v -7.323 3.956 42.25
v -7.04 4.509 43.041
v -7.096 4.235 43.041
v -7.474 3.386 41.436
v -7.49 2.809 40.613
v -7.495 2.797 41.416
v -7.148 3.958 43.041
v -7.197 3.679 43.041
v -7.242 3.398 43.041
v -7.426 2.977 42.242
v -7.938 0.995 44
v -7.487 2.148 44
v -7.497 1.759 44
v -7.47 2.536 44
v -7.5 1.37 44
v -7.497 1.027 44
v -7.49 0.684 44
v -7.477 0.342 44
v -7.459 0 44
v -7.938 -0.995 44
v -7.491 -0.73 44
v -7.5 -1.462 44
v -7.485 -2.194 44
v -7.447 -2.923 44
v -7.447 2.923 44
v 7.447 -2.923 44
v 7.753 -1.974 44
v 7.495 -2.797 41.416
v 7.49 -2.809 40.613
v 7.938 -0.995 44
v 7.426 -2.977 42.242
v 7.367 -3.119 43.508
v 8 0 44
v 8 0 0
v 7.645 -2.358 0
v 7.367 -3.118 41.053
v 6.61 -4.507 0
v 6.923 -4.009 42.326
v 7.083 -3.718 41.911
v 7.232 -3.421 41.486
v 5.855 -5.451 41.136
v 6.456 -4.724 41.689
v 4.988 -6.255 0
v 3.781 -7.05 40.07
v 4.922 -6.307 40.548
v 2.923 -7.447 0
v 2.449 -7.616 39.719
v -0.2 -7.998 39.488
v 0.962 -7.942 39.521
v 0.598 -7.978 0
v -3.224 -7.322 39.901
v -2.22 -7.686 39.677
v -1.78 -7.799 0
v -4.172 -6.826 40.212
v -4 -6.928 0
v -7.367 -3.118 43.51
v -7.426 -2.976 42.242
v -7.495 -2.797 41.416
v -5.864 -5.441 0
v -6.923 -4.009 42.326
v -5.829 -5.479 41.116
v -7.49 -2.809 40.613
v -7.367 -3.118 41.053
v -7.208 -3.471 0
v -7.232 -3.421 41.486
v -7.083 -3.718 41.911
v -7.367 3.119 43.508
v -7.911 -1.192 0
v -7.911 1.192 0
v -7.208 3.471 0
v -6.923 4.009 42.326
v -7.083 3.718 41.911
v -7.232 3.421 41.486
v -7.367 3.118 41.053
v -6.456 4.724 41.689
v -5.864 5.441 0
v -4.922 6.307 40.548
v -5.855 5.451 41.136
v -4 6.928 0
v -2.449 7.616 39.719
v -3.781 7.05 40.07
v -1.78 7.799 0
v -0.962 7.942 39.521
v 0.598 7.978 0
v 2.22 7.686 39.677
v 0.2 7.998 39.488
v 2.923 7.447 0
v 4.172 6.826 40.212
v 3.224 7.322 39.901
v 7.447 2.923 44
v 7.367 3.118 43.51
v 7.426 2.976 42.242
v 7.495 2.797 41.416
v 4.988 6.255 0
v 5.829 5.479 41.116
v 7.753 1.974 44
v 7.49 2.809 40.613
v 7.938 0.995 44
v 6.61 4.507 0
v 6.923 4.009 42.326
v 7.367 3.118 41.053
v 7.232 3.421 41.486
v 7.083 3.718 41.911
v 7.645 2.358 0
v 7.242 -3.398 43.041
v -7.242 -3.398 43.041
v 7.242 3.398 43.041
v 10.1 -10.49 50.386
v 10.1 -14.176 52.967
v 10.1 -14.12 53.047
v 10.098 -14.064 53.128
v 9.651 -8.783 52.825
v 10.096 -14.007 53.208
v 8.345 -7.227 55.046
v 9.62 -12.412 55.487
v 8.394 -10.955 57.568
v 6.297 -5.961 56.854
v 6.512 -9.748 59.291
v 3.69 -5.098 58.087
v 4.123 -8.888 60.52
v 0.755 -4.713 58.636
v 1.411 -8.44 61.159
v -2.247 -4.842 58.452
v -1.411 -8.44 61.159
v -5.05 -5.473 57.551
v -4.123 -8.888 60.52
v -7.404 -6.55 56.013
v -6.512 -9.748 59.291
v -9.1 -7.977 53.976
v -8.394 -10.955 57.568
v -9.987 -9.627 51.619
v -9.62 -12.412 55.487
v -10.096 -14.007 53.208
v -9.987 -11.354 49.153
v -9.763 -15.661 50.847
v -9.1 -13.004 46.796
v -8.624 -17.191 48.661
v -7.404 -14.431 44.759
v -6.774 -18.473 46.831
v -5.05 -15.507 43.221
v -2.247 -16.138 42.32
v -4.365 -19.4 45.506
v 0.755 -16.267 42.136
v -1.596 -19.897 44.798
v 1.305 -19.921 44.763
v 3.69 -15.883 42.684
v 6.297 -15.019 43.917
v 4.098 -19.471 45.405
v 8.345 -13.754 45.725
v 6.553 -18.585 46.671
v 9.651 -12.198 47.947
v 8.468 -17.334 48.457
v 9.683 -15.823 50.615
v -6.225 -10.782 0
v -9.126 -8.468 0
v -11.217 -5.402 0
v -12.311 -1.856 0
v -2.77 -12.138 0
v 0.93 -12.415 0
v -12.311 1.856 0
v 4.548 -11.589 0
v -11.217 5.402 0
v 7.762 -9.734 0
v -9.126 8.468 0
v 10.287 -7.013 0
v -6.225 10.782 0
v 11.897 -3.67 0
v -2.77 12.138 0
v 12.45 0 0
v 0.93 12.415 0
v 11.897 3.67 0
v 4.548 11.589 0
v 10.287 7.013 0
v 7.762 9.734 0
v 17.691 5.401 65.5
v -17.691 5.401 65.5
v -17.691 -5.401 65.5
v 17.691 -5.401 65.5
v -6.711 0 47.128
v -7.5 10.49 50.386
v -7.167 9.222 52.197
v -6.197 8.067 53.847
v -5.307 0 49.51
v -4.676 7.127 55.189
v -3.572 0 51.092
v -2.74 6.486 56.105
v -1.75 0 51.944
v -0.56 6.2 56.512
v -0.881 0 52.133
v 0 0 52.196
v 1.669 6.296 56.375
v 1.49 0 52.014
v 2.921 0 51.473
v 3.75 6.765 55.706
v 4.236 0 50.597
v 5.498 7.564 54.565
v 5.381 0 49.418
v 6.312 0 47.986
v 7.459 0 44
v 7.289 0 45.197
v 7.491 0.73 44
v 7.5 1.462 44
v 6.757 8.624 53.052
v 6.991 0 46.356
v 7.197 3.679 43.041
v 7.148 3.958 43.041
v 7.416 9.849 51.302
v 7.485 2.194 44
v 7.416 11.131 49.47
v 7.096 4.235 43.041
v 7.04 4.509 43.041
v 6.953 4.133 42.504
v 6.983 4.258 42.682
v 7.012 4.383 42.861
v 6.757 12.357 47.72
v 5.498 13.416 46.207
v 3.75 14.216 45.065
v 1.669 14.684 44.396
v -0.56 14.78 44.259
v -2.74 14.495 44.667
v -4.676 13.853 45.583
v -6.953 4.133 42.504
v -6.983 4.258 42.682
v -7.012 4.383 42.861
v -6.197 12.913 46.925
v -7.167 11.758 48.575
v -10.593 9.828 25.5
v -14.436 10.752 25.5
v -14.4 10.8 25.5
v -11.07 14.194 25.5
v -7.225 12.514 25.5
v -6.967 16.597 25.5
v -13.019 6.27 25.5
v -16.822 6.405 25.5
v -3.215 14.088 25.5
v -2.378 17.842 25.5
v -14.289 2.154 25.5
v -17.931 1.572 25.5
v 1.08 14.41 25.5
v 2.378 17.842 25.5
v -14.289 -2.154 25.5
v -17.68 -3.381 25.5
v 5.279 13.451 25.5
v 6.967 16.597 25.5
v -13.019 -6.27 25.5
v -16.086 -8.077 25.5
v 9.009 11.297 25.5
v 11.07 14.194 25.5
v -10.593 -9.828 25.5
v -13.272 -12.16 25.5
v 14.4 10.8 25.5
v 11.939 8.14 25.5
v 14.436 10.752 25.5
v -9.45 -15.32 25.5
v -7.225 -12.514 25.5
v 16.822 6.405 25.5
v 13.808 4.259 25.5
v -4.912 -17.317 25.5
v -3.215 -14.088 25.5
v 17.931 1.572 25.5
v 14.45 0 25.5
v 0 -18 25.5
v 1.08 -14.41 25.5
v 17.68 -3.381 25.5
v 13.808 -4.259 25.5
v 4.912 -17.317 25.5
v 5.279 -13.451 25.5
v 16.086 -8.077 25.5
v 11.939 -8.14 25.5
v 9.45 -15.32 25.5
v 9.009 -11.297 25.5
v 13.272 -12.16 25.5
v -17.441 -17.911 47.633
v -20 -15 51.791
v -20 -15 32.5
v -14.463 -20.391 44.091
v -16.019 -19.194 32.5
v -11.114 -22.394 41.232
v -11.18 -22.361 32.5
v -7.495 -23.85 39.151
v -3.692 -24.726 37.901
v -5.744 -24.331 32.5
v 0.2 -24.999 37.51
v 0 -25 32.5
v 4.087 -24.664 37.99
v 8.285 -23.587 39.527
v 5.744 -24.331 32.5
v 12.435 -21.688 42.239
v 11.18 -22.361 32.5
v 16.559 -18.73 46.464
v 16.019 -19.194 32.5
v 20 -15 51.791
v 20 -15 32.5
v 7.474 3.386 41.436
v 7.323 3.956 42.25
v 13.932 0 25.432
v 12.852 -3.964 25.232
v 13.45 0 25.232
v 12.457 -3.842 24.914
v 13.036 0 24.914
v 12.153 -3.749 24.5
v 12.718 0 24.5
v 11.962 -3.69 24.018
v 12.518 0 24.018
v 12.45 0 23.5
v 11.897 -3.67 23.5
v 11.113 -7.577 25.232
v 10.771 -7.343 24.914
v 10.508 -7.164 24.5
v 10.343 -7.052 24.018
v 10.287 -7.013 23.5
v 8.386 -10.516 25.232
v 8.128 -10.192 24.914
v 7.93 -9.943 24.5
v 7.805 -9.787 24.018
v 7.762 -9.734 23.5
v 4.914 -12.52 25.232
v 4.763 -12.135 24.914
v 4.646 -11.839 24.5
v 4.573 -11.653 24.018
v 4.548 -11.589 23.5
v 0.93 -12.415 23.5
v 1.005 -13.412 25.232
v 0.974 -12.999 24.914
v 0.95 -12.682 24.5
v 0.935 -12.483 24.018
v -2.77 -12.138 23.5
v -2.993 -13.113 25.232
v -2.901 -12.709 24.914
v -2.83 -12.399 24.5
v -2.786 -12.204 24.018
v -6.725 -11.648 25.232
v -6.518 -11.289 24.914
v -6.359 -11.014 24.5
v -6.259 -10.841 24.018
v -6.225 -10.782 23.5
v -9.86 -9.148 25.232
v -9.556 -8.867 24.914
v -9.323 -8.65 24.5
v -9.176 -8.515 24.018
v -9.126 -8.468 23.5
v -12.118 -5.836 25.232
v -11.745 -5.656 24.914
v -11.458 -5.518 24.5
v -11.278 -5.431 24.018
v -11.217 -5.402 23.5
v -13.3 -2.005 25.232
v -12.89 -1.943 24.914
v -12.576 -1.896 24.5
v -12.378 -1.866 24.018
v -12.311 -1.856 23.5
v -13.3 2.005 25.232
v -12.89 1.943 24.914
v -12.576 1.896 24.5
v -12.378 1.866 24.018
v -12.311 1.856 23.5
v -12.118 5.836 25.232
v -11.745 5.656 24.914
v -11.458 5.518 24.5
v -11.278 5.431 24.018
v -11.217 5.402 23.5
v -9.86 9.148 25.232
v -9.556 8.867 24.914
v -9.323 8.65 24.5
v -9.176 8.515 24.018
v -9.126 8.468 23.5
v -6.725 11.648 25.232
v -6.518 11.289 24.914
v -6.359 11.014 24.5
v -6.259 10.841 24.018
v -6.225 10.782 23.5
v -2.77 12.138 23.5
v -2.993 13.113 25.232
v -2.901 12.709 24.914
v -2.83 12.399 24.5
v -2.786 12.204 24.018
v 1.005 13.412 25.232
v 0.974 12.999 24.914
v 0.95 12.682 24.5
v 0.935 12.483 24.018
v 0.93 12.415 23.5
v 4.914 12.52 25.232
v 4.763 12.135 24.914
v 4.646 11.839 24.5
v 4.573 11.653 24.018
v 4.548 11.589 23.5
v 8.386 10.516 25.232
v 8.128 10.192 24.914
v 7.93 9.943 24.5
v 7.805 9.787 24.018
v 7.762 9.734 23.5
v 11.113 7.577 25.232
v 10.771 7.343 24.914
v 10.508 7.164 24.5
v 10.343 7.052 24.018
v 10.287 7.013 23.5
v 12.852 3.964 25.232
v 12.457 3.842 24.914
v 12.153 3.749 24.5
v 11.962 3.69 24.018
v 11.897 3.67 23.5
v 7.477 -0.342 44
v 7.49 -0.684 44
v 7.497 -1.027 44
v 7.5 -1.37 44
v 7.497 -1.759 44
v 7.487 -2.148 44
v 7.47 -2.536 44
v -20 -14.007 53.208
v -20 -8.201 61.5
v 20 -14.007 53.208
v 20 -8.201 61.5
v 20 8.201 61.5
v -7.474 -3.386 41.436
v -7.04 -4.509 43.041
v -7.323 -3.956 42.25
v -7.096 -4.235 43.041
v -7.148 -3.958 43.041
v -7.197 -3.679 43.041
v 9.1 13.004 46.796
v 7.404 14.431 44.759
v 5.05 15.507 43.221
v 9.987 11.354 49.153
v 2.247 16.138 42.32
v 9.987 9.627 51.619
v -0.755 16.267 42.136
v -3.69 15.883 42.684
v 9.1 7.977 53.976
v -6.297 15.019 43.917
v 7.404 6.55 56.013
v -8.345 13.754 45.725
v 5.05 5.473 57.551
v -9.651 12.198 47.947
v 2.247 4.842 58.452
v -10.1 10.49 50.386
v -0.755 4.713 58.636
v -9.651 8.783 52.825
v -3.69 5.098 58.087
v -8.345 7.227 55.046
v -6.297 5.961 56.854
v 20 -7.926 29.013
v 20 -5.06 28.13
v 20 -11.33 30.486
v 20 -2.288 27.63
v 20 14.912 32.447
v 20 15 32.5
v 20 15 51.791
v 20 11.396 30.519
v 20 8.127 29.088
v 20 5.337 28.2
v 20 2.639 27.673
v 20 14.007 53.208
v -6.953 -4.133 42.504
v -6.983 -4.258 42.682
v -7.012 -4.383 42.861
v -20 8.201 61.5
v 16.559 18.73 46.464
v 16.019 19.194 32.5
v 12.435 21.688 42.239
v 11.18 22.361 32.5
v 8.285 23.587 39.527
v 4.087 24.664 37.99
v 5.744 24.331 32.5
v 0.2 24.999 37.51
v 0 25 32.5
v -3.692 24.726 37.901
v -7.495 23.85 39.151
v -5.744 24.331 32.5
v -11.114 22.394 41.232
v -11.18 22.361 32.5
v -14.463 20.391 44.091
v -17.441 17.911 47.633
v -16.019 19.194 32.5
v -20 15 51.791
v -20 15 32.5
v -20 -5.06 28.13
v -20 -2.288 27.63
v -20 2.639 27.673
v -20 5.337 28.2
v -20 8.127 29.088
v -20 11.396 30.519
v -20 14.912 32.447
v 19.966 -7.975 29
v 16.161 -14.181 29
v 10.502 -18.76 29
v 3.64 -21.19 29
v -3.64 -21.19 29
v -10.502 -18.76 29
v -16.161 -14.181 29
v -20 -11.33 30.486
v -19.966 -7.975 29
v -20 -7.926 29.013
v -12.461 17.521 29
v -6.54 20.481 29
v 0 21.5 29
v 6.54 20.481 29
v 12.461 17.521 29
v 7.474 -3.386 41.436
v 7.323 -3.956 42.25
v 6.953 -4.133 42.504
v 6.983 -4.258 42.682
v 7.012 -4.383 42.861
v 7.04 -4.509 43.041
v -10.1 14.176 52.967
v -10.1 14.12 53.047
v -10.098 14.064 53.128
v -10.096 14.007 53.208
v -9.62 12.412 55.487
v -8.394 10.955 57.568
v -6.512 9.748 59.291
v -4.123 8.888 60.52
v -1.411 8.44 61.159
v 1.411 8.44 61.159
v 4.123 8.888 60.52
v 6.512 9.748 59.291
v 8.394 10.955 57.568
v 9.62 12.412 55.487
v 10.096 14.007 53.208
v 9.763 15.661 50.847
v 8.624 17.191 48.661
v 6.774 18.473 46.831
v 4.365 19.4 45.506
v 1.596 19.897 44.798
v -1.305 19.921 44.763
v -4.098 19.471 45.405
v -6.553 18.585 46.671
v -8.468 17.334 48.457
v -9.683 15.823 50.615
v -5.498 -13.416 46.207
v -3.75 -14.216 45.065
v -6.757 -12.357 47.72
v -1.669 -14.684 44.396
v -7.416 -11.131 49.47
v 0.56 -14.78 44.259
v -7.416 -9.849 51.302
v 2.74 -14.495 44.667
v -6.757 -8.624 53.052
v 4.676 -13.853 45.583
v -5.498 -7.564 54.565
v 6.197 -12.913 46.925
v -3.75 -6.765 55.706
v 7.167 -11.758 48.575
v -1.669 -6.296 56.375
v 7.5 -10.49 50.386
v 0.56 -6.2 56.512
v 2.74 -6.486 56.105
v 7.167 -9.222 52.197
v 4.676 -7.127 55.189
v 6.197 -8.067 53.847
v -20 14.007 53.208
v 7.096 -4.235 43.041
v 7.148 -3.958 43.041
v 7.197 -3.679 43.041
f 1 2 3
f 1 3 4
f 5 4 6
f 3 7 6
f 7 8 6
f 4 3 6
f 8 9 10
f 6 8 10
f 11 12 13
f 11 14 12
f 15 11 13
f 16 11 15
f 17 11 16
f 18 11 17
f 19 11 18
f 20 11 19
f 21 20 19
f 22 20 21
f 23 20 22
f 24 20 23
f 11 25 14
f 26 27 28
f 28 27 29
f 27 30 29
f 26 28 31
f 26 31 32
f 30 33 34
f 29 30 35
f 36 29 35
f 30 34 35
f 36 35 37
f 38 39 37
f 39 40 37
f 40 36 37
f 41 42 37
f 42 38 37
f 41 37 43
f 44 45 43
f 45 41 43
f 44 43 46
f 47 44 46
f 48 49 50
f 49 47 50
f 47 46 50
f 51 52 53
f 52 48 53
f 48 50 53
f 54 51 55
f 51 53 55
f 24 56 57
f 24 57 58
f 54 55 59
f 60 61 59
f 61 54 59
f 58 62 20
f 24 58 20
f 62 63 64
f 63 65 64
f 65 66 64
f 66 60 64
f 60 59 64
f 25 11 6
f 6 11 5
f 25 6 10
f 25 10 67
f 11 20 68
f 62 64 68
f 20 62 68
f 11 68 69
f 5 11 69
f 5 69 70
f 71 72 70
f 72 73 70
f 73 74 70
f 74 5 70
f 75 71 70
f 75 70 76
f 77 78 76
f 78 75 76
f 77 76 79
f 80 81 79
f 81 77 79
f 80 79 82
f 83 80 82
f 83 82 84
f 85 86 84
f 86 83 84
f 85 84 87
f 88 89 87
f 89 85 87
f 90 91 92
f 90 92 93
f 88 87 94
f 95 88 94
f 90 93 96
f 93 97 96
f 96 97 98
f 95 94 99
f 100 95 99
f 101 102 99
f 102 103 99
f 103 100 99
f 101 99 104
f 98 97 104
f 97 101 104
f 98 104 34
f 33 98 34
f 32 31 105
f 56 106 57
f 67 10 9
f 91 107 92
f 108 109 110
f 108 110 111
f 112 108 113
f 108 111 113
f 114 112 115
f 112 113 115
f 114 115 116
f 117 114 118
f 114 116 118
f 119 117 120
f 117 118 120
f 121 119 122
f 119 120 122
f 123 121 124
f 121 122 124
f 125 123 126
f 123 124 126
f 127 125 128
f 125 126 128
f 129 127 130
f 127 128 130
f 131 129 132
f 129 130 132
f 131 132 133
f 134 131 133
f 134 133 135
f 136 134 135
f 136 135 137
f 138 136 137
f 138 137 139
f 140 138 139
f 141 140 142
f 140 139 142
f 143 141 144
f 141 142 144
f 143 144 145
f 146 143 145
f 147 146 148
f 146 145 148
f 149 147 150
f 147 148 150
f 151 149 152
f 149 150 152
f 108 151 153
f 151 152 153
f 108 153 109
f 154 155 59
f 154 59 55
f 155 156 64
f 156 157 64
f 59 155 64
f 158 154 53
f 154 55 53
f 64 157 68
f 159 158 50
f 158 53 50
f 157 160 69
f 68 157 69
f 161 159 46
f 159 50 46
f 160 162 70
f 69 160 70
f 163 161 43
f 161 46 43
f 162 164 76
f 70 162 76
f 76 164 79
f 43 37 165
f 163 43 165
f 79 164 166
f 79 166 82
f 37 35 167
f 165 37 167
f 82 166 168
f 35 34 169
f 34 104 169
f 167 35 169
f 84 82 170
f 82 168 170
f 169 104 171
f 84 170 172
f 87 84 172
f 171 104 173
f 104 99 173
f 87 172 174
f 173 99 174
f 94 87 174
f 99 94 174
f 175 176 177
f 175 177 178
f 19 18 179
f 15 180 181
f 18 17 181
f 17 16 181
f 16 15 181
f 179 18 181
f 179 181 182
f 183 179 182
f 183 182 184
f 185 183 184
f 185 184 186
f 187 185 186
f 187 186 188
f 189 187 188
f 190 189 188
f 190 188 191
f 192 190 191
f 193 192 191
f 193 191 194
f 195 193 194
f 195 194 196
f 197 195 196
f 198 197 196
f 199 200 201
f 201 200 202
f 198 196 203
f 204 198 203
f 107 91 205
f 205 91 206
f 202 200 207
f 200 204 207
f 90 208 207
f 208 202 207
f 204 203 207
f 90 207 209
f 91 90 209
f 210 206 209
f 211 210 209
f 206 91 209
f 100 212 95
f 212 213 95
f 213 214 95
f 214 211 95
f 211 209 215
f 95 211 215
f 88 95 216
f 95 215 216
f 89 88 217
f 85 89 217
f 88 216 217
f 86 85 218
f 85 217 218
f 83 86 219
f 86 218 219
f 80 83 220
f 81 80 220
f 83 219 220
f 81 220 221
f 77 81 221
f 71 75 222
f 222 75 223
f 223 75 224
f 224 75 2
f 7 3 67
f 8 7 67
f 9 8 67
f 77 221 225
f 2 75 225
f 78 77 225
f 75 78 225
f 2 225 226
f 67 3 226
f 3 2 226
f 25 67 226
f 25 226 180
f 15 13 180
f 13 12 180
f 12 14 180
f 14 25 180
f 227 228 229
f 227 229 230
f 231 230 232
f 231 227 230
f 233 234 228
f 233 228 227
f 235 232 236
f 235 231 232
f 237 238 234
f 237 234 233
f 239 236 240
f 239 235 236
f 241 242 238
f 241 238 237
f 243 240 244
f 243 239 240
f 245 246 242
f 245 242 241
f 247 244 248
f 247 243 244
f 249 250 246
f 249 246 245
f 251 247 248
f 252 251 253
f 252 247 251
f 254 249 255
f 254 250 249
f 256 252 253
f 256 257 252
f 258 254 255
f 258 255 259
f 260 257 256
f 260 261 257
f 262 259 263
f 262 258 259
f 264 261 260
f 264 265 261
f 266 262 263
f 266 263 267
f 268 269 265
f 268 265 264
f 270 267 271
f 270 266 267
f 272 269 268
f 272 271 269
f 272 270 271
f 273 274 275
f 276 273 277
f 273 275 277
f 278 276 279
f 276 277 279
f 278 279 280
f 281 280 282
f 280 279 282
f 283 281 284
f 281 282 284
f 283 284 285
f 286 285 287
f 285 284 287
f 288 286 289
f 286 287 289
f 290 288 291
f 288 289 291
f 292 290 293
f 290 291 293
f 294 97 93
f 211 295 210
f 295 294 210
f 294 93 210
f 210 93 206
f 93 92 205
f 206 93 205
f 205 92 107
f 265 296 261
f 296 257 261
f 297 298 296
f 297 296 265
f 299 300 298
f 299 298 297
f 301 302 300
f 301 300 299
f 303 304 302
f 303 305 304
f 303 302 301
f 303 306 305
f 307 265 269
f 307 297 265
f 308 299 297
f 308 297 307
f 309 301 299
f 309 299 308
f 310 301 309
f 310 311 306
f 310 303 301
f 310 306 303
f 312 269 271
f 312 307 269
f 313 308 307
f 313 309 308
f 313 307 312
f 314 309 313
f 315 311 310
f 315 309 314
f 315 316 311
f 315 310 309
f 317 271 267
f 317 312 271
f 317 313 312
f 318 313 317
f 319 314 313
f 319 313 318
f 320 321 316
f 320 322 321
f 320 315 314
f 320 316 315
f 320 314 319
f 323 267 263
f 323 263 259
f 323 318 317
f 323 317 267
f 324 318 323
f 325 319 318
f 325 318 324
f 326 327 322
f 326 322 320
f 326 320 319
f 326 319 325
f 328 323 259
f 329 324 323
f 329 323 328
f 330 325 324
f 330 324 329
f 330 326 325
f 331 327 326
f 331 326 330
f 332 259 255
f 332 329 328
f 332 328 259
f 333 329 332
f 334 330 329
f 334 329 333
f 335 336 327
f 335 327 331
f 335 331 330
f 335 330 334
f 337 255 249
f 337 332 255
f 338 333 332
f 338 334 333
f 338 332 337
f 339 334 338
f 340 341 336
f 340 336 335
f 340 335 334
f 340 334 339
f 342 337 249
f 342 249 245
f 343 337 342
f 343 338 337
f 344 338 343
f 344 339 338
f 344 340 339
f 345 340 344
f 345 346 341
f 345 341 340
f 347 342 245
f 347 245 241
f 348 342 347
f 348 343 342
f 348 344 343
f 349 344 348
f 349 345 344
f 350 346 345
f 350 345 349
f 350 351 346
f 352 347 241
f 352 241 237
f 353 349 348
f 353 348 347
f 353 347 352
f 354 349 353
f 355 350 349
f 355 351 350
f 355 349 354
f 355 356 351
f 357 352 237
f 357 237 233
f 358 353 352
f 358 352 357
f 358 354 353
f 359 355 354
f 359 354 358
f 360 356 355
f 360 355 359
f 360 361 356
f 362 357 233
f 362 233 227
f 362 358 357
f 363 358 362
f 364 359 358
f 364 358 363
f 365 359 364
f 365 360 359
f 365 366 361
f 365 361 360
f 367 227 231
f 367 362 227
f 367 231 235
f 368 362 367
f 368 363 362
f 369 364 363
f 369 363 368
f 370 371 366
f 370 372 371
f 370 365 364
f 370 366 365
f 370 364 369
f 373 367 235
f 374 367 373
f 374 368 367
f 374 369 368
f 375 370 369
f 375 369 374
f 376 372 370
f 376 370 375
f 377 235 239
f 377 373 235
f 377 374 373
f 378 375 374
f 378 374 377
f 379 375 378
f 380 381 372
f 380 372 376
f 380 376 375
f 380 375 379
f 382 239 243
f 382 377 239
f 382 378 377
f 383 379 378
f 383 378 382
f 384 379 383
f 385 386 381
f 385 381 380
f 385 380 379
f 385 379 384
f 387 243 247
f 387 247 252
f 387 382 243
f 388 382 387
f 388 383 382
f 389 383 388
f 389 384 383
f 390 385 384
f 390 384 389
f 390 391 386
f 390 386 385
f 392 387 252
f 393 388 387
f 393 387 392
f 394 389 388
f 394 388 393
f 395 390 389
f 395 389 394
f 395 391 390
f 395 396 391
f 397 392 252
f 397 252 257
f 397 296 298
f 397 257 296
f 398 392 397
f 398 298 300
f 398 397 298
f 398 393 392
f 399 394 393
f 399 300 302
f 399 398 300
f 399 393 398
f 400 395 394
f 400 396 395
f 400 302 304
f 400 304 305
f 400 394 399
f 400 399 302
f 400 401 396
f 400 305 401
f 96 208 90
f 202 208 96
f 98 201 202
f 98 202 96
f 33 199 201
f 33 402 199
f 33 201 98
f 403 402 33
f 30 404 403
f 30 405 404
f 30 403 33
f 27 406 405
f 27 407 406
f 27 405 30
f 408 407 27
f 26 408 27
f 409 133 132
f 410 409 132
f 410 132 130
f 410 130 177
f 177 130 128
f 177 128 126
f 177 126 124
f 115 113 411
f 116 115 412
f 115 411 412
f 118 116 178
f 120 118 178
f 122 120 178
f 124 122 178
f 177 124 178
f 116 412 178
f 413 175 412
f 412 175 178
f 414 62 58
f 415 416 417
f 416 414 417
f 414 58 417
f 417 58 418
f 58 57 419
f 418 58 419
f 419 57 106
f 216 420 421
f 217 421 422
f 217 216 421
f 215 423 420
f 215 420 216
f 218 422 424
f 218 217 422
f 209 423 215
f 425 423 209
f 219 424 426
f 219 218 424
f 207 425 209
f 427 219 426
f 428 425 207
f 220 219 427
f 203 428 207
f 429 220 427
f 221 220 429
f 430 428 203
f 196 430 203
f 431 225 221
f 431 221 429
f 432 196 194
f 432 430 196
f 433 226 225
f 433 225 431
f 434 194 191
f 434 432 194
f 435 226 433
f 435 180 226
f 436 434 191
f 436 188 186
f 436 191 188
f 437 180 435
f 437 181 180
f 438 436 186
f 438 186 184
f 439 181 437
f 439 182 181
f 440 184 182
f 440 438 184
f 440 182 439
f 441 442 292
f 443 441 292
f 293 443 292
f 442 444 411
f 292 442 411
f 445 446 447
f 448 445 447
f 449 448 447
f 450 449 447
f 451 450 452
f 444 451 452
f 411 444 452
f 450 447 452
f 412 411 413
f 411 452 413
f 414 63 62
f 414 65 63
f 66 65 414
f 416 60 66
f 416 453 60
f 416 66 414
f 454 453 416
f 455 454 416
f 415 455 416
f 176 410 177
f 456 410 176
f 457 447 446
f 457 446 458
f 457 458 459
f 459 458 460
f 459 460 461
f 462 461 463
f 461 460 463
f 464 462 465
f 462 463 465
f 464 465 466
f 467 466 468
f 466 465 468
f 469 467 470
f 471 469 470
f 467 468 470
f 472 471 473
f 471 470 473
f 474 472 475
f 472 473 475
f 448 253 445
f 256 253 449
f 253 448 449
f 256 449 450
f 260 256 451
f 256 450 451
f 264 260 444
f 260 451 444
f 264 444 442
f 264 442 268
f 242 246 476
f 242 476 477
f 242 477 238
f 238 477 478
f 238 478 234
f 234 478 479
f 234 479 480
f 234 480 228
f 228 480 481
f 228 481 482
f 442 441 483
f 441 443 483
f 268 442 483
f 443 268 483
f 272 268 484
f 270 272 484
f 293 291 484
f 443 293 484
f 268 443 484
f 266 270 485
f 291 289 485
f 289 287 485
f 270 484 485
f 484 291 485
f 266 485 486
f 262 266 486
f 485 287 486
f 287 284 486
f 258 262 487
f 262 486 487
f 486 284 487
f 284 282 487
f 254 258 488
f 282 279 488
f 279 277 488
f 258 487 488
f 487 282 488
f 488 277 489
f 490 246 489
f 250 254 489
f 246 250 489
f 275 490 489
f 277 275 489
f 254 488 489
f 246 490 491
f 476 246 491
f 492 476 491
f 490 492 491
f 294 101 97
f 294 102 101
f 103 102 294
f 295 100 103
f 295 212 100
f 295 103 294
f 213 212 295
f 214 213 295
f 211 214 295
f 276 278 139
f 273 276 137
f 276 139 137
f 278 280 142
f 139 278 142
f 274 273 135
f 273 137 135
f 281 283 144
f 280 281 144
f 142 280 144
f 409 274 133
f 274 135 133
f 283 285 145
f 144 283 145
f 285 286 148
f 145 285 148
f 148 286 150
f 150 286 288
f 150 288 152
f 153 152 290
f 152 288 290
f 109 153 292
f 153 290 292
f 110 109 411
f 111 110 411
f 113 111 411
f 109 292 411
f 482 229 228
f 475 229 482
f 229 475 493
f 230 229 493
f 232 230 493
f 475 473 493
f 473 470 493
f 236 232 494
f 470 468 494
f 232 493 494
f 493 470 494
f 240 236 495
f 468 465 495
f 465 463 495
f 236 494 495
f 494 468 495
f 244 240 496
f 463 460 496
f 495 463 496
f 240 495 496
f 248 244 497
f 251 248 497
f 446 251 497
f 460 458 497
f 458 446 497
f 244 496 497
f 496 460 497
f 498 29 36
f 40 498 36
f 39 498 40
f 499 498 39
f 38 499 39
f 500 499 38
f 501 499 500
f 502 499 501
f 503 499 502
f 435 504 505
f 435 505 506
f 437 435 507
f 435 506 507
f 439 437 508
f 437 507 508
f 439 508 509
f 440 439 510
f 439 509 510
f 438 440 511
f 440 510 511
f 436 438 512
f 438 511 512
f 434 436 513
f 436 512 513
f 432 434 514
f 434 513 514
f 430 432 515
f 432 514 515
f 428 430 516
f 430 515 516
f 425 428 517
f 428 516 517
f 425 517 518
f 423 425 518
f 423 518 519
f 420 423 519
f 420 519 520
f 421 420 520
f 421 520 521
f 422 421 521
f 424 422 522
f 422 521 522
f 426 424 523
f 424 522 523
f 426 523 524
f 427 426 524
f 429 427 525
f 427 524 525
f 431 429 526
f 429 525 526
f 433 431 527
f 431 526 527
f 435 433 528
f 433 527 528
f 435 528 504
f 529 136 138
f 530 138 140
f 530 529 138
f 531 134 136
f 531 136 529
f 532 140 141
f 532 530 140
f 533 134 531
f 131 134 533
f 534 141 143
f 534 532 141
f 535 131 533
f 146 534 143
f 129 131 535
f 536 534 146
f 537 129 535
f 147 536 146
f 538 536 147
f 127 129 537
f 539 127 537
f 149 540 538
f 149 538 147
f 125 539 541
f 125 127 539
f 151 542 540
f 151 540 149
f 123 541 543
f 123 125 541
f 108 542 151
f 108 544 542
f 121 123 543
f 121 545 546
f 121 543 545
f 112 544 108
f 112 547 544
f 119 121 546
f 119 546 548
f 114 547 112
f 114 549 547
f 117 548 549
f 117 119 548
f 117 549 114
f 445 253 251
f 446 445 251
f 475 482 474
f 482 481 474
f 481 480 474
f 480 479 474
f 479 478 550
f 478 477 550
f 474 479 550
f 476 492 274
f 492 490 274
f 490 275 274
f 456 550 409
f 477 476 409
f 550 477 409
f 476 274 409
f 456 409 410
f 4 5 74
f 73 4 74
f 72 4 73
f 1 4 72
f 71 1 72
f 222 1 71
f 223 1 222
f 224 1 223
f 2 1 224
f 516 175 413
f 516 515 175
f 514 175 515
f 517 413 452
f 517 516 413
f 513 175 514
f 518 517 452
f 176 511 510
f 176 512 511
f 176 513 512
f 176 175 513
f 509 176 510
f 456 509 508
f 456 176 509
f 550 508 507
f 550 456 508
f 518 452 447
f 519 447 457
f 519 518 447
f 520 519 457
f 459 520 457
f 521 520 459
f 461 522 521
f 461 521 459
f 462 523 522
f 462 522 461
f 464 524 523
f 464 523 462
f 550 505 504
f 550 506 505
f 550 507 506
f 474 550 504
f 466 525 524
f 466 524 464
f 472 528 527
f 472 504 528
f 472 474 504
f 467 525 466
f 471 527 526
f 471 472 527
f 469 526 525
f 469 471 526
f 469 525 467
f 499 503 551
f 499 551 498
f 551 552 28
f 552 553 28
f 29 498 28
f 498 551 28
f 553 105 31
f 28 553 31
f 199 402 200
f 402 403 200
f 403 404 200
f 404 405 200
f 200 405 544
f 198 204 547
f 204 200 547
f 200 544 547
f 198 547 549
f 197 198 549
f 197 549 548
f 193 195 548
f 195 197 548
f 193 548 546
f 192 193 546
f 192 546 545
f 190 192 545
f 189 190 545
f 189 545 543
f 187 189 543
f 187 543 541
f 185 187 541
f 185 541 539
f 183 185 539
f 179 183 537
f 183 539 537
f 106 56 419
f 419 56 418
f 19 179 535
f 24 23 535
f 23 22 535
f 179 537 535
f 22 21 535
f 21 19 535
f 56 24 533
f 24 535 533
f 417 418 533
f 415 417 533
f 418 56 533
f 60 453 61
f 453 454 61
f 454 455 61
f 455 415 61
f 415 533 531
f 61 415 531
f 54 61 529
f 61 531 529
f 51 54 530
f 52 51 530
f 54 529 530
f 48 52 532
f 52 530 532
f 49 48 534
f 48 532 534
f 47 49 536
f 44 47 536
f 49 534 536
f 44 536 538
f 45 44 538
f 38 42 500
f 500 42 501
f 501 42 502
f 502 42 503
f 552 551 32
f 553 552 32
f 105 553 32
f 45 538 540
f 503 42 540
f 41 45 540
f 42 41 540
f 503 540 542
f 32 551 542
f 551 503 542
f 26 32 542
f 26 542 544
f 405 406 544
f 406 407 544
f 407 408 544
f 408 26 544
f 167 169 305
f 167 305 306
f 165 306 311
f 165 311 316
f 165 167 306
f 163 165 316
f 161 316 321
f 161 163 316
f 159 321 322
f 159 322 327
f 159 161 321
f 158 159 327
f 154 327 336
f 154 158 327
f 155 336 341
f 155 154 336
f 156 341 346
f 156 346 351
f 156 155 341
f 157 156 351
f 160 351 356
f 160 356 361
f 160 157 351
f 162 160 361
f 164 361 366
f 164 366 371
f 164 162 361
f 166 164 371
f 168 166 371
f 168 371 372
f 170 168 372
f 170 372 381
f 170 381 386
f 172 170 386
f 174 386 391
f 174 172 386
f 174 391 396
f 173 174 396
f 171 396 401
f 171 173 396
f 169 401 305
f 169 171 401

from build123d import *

# Parameters (mm, degrees)
F0_R        = 25
F1_DEPTH    = 65.5
F2_R        = 8
F3_DEPTH    = 44
F4_W        = 17.7049817399
F4_H        = 63.7933180105
F4_W_2      = 20.9798936745
F4_H_2      = 49.4306737048
F5_DEPTH    = 49.3
F6_C1_SIZE2 = 2.3094010768
F6_C1_SIZE  = 4
F6_C2_SIZE2 = 4
F6_C2_SIZE  = 2.3094010768
F7_R        = 27.6347360806
F7_R_2      = 12.45
F8_DEPTH    = 25.5
F9_R        = 2
F11_DEPTH   = 44.3
F12_C1_SIZE = 7
F12_C2_SIZE = 6.9999
F13_R       = 10.1
F14_DEPTH   = 4.5
F15_R       = 10.1
F16_DEPTH   = 4.5
F17_R       = 7.5
F18_DEPTH   = 16.5
F19_R       = 7.5
F20_DEPTH   = 16.5


# Not quite as in the source:
# - a fillet or chamfer is up to 0.001 mm smaller than in the source, because OpenCascade refuses the exact size


with BuildPart() as f1:
    # F0 (on Top) → F1 (new body)
    with BuildSketch(Plane.XY):
        Circle(F0_R)
    extrude(amount=F1_DEPTH)

    # F2 (on face) → F3 (cut)
    with BuildSketch(Plane(origin=(0, 0, 0), x_dir=(1, 0, 0), z_dir=(0, 0, -1))):
        Circle(F2_R)
    extrude(amount=-F3_DEPTH, mode=Mode.SUBTRACT)

    # F4 (on Front) → F5 (cut, symmetric)
    with BuildSketch(Plane.XZ):
        with Locations((28.8524908699, 55.8966590053)):
            Rectangle(F4_W, F4_H)
        with Locations((-30.4899468372, 48.7153368524)):
            Rectangle(F4_W_2, F4_H_2)
    extrude(amount=F5_DEPTH, both=True, mode=Mode.SUBTRACT)

    # F6: chamfer of 4 x 2.3094010768 on 2 edges, made by hand

    # F6_c1
    f6_c1_edges = [f1.edges().sort_by_distance(p)[0] for p in [
        (20, 0, 65.5),
    ]]
    f6_c1_side = f1.faces().sort_by_distance((20, 0, 65.4538119785))[0]
    chamfer(f6_c1_edges, length=F6_C1_SIZE, length2=F6_C1_SIZE2, reference=f6_c1_side)

    # F6_c2
    f6_c2_edges = [f1.edges().sort_by_distance(p)[0] for p in [
        (-20, 0, 65.5),
    ]]
    f6_c2_side = f1.faces().sort_by_distance((-19.9538119785, 0, 65.5))[0]
    chamfer(f6_c2_edges, length=F6_C2_SIZE, length2=F6_C2_SIZE2, reference=f6_c2_side)

    # F7 (on face) → F8 (cut)
    with BuildSketch(Plane(origin=(0, 0, 0), x_dir=(1, 0, 0), z_dir=(0, 0, -1))):
        Circle(F7_R)
        Circle(F7_R_2, mode=Mode.SUBTRACT)
    extrude(amount=-F8_DEPTH, mode=Mode.SUBTRACT)

    # F9
    f9_edges = [f1.edges().sort_by_distance(p)[0] for p in [
        (-12.45, 0, 25.5),
    ]]
    fillet(f9_edges, radius=F9_R)

    # F10 (on Right) → F11 (cut, symmetric)
    with BuildSketch(Plane.YZ):
        Polygon((2.7942564781, 69.2223283856), (14.0074999573, 53.2081570616), (27.8284827581, 33.4697480234), (27.8284827581, 71.2105557323), align=None)
        Polygon((-28.691531344, 32.2371869058), (-14.0074999573, 53.2081570616), (-2.0273737507, 70.3175504242), (-27.1908640862, 71.7121362686), align=None)
    extrude(amount=F11_DEPTH, both=True, mode=Mode.SUBTRACT)

    # F12: chamfer of 7 on 3 edges, made by hand

    # F12_c1
    f12_c1_edges = [f1.edges().sort_by_distance(p)[0] for p in [
        (0, 25, 25.5),
    ]]
    chamfer(f12_c1_edges, length=F12_C1_SIZE)

    # F12_c2 (size 7 in the source; OpenCascade refuses exactly that, so slightly less here)
    f12_c2_edges = [f1.edges().sort_by_distance(p)[0] for p in [
        (0, -25, 25.5),
    ]]
    chamfer(f12_c2_edges, length=F12_C2_SIZE)

    # F13 (on face) → F14 (cut)
    with BuildSketch(Plane(origin=(0, -34.3988298284, 24.0863199514), x_dir=(1, 0, 0), z_dir=(0, -0.8191520443, 0.5735764364))):
        with Locations((0, 35.2567682304)):
            Circle(F13_R)
    extrude(amount=-F14_DEPTH, mode=Mode.SUBTRACT)

    # F15 (on face) → F16 (cut)
    with BuildSketch(Plane(origin=(0, 34.3988298284, 24.0863199514), x_dir=(-1, 0, 0), z_dir=(0, 0.8191520443, 0.5735764364))):
        with Locations((0, 35.2567682304)):
            Circle(F15_R)
    extrude(amount=-F16_DEPTH, mode=Mode.SUBTRACT)

    # F17 (on face) → F18 (cut)
    with BuildSketch(Plane(origin=(0, 30.7126456291, 21.5052259879), x_dir=(-1, 0, 0), z_dir=(0, 0.8191520443, 0.5735764364))):
        with Locations((0, 35.2567682304)):
            Circle(F17_R)
    extrude(amount=-F18_DEPTH, mode=Mode.SUBTRACT)

    # F19 (on face) → F20 (cut)
    with BuildSketch(Plane(origin=(0, -30.7126456291, 21.5052259879), x_dir=(1, 0, 0), z_dir=(0, -0.8191520443, 0.5735764364))):
        with Locations((0, 35.2567682304)):
            Circle(F19_R)
    extrude(amount=-F20_DEPTH, mode=Mode.SUBTRACT)


solid = f1.part
